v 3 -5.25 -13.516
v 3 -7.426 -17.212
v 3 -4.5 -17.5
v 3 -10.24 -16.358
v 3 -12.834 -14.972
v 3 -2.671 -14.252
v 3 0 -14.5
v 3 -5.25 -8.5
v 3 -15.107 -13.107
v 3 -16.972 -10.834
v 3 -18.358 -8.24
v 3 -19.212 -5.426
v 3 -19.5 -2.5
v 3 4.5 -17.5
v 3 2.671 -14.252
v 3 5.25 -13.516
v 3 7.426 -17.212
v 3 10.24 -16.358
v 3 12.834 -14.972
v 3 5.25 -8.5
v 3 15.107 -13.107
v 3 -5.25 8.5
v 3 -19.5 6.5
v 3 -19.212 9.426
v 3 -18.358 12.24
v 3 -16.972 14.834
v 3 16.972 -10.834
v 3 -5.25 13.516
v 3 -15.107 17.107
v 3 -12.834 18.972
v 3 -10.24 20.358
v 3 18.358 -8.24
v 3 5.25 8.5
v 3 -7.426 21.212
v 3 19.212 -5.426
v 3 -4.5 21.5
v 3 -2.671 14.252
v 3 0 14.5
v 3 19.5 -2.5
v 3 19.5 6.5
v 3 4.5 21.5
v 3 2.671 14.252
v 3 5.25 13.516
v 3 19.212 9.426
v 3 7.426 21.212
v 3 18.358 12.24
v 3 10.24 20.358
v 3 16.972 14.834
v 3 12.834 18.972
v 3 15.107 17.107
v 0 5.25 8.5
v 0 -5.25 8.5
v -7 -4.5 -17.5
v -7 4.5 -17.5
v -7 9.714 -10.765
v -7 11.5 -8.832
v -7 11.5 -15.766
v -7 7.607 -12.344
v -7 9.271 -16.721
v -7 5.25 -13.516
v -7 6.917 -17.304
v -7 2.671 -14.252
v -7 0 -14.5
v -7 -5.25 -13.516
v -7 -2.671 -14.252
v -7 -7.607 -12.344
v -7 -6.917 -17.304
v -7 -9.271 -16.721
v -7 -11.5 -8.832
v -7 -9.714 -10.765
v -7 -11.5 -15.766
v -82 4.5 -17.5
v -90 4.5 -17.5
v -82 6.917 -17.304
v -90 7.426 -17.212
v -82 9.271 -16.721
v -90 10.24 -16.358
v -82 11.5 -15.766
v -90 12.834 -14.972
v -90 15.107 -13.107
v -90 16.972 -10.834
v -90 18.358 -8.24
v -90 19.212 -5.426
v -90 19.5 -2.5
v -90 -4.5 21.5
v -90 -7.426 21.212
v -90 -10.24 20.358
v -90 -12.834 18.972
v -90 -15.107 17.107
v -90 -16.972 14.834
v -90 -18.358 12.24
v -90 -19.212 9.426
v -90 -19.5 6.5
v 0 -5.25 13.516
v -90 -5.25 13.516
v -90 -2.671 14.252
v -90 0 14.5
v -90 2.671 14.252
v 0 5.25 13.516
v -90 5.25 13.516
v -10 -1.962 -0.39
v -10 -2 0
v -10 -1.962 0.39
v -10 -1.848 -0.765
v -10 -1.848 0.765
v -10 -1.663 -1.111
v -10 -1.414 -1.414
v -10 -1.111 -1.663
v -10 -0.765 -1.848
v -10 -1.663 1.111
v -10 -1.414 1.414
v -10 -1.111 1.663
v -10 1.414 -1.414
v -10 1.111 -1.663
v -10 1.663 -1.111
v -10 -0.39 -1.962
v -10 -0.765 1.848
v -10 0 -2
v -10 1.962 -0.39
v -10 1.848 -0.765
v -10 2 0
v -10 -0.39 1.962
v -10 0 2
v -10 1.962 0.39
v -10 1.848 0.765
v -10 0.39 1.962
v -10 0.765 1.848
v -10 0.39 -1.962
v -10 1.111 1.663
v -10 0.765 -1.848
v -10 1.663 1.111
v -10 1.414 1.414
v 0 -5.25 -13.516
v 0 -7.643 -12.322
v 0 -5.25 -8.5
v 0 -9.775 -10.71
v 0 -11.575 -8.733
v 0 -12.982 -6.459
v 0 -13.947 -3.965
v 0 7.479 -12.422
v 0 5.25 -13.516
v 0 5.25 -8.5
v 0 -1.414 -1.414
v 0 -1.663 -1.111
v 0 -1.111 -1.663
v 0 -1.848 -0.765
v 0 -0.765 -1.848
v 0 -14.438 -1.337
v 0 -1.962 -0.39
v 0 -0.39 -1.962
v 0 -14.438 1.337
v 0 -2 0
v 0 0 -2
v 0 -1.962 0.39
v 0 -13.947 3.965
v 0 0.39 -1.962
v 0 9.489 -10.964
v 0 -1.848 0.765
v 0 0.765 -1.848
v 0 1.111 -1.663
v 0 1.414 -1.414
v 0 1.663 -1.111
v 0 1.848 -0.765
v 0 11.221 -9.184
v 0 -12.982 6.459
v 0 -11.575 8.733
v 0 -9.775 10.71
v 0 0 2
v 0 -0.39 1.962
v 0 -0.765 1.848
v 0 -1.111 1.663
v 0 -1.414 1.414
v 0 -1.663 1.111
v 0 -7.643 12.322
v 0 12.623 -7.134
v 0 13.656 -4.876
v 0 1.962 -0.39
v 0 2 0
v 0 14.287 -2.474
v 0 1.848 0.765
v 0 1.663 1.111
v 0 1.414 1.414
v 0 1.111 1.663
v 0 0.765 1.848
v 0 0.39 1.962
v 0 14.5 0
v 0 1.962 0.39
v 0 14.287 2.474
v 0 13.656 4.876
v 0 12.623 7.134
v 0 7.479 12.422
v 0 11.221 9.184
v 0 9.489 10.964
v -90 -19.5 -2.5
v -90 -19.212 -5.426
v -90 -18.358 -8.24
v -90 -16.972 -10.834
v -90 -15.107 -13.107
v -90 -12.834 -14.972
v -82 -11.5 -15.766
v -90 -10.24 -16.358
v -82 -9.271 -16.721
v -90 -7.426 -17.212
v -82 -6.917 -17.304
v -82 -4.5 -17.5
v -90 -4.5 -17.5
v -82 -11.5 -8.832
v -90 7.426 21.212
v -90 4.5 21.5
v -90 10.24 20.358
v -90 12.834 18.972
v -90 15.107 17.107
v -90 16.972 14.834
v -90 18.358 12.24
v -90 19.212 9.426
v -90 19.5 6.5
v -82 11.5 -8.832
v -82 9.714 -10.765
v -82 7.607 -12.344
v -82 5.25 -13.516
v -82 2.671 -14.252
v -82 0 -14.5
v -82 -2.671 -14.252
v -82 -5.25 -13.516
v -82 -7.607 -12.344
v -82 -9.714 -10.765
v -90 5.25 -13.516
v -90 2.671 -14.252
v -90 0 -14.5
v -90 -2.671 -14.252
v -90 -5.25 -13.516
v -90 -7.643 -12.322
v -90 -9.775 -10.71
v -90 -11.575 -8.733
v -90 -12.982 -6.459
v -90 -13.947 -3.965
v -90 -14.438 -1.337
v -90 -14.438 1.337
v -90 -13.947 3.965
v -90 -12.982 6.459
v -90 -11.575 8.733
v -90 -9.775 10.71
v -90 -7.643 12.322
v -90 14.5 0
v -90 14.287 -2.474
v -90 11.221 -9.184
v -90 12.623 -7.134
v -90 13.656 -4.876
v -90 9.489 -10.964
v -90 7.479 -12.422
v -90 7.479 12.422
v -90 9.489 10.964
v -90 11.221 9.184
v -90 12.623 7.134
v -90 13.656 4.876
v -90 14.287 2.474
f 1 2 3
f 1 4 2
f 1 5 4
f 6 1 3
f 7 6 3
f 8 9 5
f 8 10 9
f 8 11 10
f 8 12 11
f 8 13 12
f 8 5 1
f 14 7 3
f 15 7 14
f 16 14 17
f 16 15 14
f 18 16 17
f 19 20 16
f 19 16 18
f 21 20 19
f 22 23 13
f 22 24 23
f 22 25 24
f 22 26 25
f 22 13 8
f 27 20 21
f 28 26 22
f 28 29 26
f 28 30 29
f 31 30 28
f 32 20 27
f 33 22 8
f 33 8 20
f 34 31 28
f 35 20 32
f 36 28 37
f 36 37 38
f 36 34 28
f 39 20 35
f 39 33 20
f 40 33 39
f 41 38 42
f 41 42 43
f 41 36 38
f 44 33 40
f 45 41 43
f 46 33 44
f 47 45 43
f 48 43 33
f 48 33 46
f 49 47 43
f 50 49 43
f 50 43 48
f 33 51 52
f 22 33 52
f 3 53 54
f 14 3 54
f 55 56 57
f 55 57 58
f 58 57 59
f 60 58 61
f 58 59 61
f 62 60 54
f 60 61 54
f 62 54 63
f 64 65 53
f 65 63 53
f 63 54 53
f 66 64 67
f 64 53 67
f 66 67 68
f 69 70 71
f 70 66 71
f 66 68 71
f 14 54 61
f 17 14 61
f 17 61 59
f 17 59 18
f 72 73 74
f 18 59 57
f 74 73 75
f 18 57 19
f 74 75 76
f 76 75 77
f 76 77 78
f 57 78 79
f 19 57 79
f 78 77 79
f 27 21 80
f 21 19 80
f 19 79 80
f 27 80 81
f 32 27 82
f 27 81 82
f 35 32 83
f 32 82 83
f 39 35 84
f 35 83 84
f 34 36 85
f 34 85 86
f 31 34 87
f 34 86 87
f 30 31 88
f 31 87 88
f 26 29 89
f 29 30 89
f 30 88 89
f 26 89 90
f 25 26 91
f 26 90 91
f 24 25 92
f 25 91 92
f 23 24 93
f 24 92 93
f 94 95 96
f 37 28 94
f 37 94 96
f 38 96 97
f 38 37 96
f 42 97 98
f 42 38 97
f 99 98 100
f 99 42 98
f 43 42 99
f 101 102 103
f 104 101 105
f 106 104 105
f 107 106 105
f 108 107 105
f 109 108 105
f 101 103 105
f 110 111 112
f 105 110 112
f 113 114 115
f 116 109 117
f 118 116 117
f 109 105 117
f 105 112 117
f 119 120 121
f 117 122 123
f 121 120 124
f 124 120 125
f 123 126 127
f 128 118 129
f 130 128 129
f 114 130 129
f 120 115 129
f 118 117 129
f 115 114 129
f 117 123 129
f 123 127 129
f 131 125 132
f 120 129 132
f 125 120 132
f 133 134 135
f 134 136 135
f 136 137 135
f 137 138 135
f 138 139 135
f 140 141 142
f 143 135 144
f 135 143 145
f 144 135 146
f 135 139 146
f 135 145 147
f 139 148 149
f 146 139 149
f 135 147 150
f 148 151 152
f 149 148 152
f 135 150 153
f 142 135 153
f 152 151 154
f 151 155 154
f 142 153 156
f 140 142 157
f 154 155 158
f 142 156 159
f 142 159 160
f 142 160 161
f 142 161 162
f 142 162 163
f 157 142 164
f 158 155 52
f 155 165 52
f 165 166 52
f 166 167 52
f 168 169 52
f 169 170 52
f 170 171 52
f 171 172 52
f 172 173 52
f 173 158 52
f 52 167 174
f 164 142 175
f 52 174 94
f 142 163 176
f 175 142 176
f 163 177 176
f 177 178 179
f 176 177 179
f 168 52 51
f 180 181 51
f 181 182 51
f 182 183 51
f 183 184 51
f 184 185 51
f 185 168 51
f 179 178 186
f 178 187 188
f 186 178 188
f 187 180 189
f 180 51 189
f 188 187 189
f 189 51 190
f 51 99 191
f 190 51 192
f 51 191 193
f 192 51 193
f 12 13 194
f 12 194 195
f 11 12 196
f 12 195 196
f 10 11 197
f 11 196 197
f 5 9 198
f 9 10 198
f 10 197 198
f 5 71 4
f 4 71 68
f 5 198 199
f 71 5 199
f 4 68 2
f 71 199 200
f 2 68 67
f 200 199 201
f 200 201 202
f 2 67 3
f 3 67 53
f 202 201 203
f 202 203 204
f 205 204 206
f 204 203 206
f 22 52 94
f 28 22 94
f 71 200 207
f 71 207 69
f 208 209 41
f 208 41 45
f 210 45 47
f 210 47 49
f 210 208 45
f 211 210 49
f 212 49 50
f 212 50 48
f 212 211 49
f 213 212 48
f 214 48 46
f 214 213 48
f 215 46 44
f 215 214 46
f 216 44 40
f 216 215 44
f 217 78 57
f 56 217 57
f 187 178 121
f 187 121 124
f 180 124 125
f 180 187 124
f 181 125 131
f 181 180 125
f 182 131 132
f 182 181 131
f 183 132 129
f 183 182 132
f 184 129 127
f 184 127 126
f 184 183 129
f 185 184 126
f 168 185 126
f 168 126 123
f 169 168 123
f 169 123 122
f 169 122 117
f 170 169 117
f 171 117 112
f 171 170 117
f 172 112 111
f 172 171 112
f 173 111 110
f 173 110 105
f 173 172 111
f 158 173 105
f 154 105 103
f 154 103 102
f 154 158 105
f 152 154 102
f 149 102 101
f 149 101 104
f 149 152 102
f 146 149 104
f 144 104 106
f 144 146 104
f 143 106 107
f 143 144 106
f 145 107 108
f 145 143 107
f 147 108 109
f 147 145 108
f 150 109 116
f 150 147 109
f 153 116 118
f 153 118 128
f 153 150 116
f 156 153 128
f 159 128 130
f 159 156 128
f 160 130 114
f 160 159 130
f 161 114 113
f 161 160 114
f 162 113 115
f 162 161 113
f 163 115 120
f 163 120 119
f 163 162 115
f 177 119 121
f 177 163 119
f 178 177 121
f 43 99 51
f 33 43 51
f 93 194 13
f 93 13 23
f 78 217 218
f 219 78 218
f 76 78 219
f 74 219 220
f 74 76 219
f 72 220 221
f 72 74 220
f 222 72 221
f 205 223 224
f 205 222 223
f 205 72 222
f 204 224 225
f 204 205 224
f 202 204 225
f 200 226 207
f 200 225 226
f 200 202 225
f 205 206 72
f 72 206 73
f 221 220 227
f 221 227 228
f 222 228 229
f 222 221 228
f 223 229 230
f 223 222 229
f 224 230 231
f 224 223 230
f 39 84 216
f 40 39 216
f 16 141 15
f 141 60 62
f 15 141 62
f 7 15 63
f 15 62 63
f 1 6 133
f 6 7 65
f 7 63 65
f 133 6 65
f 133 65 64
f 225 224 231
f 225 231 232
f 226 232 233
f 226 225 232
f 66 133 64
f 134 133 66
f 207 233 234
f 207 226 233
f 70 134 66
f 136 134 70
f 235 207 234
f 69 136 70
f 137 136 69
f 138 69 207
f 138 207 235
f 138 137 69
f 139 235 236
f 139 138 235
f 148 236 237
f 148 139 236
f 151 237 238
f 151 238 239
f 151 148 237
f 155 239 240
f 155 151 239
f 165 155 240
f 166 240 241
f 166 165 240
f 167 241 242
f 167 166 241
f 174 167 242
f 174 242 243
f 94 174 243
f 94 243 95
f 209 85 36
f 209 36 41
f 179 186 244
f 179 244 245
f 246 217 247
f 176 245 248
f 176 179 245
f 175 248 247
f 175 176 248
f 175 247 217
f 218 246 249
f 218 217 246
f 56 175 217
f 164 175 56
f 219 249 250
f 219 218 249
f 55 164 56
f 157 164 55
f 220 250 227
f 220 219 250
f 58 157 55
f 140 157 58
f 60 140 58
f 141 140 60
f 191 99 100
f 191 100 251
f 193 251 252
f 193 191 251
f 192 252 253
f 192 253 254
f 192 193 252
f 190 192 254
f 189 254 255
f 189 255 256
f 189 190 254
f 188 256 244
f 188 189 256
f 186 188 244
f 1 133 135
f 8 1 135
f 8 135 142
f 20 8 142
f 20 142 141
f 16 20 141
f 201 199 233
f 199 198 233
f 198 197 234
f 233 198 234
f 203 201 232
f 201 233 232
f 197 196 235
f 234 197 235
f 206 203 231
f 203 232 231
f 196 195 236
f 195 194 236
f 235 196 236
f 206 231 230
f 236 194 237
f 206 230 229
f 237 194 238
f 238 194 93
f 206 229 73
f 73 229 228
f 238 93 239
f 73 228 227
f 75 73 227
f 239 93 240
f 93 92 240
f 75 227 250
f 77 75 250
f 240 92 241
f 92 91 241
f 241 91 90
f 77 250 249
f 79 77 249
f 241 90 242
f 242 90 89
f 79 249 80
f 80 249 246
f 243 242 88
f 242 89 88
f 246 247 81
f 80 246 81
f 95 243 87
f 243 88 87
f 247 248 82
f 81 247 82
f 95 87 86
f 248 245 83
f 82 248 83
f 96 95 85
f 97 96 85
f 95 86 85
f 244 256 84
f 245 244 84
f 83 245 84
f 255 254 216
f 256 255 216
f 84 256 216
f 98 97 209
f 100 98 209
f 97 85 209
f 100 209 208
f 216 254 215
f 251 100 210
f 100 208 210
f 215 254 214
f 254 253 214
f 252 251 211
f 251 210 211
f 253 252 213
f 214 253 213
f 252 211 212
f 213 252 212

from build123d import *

# Parameters (mm, degrees)
F0_W        = 39
F0_H        = 39
F0_R        = 16.5
F1_DEPTH    = 90
F0_R_2      = 2
F2_DEPTH    = 3
F3_W        = 75
F3_H        = 23
F4_DEPTH    = 21.5
F5_DEPTH    = 10
F6_T1_DEPTH = 127.5
F6_T3_DEPTH = 40.5


# Not quite as in the source:
# - a fillet or chamfer that OpenCascade refuses, or shapes differently, is made with other operations: its cross-section is extruded or revolved along the edge and cut away or added
# - a feature names something its author has since deleted; it is built from what else it names


with BuildPart() as f1:
    # F0 (on Right) → F1 (new body)
    with BuildSketch(Plane.YZ):
        with Locations((0, 2)):
            Rectangle(F0_W, F0_H)
        Circle(F0_R, mode=Mode.SUBTRACT)
        Circle(F0_R)
        with BuildLine():
            ThreePointArc((5.25, 13.5161939909), (11.9660979438, 8.1891696771), (14.5, 0))
            ThreePointArc((14.5, 0), (11.9660979438, -8.1891696771), (5.25, -13.5161939909))
            ThreePointArc((5.25, -13.5161939909), (0, -14.5), (-5.25, -13.5161939909))
            ThreePointArc((-5.25, -13.5161939909), (-14.5, 0), (-5.25, 13.5161939909))
            ThreePointArc((-5.25, 13.5161939909), (0, 14.5), (5.25, 13.5161939909))
        make_face(mode=Mode.SUBTRACT)
    extrude(amount=-F1_DEPTH)

    # F0 (on Right) → F2 (join)
    with BuildSketch(Plane.YZ):
        with Locations((0, 2)):
            Rectangle(F0_W, F0_H)
        Circle(F0_R, mode=Mode.SUBTRACT)
        Circle(F0_R)
        with BuildLine():
            ThreePointArc((5.25, 13.5161939909), (11.9660979438, 8.1891696771), (14.5, 0))
            ThreePointArc((14.5, 0), (11.9660979438, -8.1891696771), (5.25, -13.5161939909))
            ThreePointArc((5.25, -13.5161939909), (0, -14.5), (-5.25, -13.5161939909))
            ThreePointArc((-5.25, -13.5161939909), (-14.5, 0), (-5.25, 13.5161939909))
            ThreePointArc((-5.25, 13.5161939909), (0, 14.5), (5.25, 13.5161939909))
        make_face(mode=Mode.SUBTRACT)
        with BuildLine():
            ThreePointArc((5.25, -13.5161939909), (11.9660979438, -8.1891696771), (14.5, 0))
            ThreePointArc((14.5, 0), (11.9660979438, 8.1891696771), (5.25, 13.5161939909))
            Line((5.25, 13.5161939909), (5.25, 8.5))
            Line((5.25, 8.5), (-5.25, 8.5))
            Line((-5.25, 8.5), (-5.25, 13.5161939909))
            ThreePointArc((-5.25, 13.5161939909), (-14.5, 0), (-5.25, -13.5161939909))
            Line((-5.25, -13.5161939909), (-5.25, -8.5))
            Line((-5.25, -8.5), (5.25, -8.5))
            Line((5.25, -8.5), (5.25, -13.5161939909))
        make_face()
        Circle(F0_R_2, mode=Mode.SUBTRACT)
        Circle(F0_R_2)
    extrude(amount=F2_DEPTH)

    # F3 (on face) → F4 (cut)
    with BuildSketch(Plane(origin=(0, 0, -17.5), x_dir=(1, 0, 0), z_dir=(0, 0, -1))):
        with Locations((-44.5, 0)):
            Rectangle(F3_W, F3_H)
    extrude(amount=-F4_DEPTH, mode=Mode.SUBTRACT)

    # F0 (on Right) → F5 (join)
    with BuildSketch(Plane.YZ):
        Circle(F0_R_2)
    extrude(amount=-F5_DEPTH)

    # F6: fillet of radius 15 on 8 edges, made by hand

    # F6_s2 → F6_t1 (cut)
    with BuildSketch(Plane.YZ.offset(-127.5)):
        with BuildLine():
            ThreePointArc((4.5, -17.5), (15.1066017178, -13.1066017178), (19.5, -2.5))
            Line((19.5, -2.5), (19.5, -17.5))
            Line((19.5, -17.5), (4.5, -17.5))
        make_face()
        with BuildLine():
            ThreePointArc((-19.5, -2.5), (-15.1066017178, -13.1066017178), (-4.5, -17.5))
            Line((-4.5, -17.5), (-19.5, -17.5))
            Line((-19.5, -17.5), (-19.5, -2.5))
        make_face()
        with BuildLine():
            ThreePointArc((4.5, 21.5), (15.1066017178, 17.1066017178), (19.5, 6.5))
            Line((19.5, 6.5), (19.5, 21.5))
            Line((19.5, 21.5), (4.5, 21.5))
        make_face()
        with BuildLine():
            ThreePointArc((-4.5, 21.5), (-15.1066017178, 17.1066017178), (-19.5, 6.5))
            Line((-19.5, 6.5), (-19.5, 21.5))
            Line((-19.5, 21.5), (-4.5, 21.5))
        make_face()
    extrude(amount=F6_T1_DEPTH, mode=Mode.SUBTRACT)

    # F6_s4 → F6_t3 (cut)
    with BuildSketch(Plane.YZ):
        with BuildLine():
            ThreePointArc((4.5, -17.5), (15.1066017178, -13.1066017178), (19.5, -2.5))
            Line((19.5, -2.5), (19.5, -17.5))
            Line((19.5, -17.5), (4.5, -17.5))
        make_face()
        with BuildLine():
            ThreePointArc((-19.5, -2.5), (-15.1066017178, -13.1066017178), (-4.5, -17.5))
            Line((-4.5, -17.5), (-19.5, -17.5))
            Line((-19.5, -17.5), (-19.5, -2.5))
        make_face()
        with BuildLine():
            ThreePointArc((4.5, 21.5), (15.1066017178, 17.1066017178), (19.5, 6.5))
            Line((19.5, 6.5), (19.5, 21.5))
            Line((19.5, 21.5), (4.5, 21.5))
        make_face()
        with BuildLine():
            ThreePointArc((-4.5, 21.5), (-15.1066017178, 17.1066017178), (-19.5, 6.5))
            Line((-19.5, 6.5), (-19.5, 21.5))
            Line((-19.5, 21.5), (-4.5, 21.5))
        make_face()
    extrude(amount=F6_T3_DEPTH, mode=Mode.SUBTRACT)


solid = f1.part
